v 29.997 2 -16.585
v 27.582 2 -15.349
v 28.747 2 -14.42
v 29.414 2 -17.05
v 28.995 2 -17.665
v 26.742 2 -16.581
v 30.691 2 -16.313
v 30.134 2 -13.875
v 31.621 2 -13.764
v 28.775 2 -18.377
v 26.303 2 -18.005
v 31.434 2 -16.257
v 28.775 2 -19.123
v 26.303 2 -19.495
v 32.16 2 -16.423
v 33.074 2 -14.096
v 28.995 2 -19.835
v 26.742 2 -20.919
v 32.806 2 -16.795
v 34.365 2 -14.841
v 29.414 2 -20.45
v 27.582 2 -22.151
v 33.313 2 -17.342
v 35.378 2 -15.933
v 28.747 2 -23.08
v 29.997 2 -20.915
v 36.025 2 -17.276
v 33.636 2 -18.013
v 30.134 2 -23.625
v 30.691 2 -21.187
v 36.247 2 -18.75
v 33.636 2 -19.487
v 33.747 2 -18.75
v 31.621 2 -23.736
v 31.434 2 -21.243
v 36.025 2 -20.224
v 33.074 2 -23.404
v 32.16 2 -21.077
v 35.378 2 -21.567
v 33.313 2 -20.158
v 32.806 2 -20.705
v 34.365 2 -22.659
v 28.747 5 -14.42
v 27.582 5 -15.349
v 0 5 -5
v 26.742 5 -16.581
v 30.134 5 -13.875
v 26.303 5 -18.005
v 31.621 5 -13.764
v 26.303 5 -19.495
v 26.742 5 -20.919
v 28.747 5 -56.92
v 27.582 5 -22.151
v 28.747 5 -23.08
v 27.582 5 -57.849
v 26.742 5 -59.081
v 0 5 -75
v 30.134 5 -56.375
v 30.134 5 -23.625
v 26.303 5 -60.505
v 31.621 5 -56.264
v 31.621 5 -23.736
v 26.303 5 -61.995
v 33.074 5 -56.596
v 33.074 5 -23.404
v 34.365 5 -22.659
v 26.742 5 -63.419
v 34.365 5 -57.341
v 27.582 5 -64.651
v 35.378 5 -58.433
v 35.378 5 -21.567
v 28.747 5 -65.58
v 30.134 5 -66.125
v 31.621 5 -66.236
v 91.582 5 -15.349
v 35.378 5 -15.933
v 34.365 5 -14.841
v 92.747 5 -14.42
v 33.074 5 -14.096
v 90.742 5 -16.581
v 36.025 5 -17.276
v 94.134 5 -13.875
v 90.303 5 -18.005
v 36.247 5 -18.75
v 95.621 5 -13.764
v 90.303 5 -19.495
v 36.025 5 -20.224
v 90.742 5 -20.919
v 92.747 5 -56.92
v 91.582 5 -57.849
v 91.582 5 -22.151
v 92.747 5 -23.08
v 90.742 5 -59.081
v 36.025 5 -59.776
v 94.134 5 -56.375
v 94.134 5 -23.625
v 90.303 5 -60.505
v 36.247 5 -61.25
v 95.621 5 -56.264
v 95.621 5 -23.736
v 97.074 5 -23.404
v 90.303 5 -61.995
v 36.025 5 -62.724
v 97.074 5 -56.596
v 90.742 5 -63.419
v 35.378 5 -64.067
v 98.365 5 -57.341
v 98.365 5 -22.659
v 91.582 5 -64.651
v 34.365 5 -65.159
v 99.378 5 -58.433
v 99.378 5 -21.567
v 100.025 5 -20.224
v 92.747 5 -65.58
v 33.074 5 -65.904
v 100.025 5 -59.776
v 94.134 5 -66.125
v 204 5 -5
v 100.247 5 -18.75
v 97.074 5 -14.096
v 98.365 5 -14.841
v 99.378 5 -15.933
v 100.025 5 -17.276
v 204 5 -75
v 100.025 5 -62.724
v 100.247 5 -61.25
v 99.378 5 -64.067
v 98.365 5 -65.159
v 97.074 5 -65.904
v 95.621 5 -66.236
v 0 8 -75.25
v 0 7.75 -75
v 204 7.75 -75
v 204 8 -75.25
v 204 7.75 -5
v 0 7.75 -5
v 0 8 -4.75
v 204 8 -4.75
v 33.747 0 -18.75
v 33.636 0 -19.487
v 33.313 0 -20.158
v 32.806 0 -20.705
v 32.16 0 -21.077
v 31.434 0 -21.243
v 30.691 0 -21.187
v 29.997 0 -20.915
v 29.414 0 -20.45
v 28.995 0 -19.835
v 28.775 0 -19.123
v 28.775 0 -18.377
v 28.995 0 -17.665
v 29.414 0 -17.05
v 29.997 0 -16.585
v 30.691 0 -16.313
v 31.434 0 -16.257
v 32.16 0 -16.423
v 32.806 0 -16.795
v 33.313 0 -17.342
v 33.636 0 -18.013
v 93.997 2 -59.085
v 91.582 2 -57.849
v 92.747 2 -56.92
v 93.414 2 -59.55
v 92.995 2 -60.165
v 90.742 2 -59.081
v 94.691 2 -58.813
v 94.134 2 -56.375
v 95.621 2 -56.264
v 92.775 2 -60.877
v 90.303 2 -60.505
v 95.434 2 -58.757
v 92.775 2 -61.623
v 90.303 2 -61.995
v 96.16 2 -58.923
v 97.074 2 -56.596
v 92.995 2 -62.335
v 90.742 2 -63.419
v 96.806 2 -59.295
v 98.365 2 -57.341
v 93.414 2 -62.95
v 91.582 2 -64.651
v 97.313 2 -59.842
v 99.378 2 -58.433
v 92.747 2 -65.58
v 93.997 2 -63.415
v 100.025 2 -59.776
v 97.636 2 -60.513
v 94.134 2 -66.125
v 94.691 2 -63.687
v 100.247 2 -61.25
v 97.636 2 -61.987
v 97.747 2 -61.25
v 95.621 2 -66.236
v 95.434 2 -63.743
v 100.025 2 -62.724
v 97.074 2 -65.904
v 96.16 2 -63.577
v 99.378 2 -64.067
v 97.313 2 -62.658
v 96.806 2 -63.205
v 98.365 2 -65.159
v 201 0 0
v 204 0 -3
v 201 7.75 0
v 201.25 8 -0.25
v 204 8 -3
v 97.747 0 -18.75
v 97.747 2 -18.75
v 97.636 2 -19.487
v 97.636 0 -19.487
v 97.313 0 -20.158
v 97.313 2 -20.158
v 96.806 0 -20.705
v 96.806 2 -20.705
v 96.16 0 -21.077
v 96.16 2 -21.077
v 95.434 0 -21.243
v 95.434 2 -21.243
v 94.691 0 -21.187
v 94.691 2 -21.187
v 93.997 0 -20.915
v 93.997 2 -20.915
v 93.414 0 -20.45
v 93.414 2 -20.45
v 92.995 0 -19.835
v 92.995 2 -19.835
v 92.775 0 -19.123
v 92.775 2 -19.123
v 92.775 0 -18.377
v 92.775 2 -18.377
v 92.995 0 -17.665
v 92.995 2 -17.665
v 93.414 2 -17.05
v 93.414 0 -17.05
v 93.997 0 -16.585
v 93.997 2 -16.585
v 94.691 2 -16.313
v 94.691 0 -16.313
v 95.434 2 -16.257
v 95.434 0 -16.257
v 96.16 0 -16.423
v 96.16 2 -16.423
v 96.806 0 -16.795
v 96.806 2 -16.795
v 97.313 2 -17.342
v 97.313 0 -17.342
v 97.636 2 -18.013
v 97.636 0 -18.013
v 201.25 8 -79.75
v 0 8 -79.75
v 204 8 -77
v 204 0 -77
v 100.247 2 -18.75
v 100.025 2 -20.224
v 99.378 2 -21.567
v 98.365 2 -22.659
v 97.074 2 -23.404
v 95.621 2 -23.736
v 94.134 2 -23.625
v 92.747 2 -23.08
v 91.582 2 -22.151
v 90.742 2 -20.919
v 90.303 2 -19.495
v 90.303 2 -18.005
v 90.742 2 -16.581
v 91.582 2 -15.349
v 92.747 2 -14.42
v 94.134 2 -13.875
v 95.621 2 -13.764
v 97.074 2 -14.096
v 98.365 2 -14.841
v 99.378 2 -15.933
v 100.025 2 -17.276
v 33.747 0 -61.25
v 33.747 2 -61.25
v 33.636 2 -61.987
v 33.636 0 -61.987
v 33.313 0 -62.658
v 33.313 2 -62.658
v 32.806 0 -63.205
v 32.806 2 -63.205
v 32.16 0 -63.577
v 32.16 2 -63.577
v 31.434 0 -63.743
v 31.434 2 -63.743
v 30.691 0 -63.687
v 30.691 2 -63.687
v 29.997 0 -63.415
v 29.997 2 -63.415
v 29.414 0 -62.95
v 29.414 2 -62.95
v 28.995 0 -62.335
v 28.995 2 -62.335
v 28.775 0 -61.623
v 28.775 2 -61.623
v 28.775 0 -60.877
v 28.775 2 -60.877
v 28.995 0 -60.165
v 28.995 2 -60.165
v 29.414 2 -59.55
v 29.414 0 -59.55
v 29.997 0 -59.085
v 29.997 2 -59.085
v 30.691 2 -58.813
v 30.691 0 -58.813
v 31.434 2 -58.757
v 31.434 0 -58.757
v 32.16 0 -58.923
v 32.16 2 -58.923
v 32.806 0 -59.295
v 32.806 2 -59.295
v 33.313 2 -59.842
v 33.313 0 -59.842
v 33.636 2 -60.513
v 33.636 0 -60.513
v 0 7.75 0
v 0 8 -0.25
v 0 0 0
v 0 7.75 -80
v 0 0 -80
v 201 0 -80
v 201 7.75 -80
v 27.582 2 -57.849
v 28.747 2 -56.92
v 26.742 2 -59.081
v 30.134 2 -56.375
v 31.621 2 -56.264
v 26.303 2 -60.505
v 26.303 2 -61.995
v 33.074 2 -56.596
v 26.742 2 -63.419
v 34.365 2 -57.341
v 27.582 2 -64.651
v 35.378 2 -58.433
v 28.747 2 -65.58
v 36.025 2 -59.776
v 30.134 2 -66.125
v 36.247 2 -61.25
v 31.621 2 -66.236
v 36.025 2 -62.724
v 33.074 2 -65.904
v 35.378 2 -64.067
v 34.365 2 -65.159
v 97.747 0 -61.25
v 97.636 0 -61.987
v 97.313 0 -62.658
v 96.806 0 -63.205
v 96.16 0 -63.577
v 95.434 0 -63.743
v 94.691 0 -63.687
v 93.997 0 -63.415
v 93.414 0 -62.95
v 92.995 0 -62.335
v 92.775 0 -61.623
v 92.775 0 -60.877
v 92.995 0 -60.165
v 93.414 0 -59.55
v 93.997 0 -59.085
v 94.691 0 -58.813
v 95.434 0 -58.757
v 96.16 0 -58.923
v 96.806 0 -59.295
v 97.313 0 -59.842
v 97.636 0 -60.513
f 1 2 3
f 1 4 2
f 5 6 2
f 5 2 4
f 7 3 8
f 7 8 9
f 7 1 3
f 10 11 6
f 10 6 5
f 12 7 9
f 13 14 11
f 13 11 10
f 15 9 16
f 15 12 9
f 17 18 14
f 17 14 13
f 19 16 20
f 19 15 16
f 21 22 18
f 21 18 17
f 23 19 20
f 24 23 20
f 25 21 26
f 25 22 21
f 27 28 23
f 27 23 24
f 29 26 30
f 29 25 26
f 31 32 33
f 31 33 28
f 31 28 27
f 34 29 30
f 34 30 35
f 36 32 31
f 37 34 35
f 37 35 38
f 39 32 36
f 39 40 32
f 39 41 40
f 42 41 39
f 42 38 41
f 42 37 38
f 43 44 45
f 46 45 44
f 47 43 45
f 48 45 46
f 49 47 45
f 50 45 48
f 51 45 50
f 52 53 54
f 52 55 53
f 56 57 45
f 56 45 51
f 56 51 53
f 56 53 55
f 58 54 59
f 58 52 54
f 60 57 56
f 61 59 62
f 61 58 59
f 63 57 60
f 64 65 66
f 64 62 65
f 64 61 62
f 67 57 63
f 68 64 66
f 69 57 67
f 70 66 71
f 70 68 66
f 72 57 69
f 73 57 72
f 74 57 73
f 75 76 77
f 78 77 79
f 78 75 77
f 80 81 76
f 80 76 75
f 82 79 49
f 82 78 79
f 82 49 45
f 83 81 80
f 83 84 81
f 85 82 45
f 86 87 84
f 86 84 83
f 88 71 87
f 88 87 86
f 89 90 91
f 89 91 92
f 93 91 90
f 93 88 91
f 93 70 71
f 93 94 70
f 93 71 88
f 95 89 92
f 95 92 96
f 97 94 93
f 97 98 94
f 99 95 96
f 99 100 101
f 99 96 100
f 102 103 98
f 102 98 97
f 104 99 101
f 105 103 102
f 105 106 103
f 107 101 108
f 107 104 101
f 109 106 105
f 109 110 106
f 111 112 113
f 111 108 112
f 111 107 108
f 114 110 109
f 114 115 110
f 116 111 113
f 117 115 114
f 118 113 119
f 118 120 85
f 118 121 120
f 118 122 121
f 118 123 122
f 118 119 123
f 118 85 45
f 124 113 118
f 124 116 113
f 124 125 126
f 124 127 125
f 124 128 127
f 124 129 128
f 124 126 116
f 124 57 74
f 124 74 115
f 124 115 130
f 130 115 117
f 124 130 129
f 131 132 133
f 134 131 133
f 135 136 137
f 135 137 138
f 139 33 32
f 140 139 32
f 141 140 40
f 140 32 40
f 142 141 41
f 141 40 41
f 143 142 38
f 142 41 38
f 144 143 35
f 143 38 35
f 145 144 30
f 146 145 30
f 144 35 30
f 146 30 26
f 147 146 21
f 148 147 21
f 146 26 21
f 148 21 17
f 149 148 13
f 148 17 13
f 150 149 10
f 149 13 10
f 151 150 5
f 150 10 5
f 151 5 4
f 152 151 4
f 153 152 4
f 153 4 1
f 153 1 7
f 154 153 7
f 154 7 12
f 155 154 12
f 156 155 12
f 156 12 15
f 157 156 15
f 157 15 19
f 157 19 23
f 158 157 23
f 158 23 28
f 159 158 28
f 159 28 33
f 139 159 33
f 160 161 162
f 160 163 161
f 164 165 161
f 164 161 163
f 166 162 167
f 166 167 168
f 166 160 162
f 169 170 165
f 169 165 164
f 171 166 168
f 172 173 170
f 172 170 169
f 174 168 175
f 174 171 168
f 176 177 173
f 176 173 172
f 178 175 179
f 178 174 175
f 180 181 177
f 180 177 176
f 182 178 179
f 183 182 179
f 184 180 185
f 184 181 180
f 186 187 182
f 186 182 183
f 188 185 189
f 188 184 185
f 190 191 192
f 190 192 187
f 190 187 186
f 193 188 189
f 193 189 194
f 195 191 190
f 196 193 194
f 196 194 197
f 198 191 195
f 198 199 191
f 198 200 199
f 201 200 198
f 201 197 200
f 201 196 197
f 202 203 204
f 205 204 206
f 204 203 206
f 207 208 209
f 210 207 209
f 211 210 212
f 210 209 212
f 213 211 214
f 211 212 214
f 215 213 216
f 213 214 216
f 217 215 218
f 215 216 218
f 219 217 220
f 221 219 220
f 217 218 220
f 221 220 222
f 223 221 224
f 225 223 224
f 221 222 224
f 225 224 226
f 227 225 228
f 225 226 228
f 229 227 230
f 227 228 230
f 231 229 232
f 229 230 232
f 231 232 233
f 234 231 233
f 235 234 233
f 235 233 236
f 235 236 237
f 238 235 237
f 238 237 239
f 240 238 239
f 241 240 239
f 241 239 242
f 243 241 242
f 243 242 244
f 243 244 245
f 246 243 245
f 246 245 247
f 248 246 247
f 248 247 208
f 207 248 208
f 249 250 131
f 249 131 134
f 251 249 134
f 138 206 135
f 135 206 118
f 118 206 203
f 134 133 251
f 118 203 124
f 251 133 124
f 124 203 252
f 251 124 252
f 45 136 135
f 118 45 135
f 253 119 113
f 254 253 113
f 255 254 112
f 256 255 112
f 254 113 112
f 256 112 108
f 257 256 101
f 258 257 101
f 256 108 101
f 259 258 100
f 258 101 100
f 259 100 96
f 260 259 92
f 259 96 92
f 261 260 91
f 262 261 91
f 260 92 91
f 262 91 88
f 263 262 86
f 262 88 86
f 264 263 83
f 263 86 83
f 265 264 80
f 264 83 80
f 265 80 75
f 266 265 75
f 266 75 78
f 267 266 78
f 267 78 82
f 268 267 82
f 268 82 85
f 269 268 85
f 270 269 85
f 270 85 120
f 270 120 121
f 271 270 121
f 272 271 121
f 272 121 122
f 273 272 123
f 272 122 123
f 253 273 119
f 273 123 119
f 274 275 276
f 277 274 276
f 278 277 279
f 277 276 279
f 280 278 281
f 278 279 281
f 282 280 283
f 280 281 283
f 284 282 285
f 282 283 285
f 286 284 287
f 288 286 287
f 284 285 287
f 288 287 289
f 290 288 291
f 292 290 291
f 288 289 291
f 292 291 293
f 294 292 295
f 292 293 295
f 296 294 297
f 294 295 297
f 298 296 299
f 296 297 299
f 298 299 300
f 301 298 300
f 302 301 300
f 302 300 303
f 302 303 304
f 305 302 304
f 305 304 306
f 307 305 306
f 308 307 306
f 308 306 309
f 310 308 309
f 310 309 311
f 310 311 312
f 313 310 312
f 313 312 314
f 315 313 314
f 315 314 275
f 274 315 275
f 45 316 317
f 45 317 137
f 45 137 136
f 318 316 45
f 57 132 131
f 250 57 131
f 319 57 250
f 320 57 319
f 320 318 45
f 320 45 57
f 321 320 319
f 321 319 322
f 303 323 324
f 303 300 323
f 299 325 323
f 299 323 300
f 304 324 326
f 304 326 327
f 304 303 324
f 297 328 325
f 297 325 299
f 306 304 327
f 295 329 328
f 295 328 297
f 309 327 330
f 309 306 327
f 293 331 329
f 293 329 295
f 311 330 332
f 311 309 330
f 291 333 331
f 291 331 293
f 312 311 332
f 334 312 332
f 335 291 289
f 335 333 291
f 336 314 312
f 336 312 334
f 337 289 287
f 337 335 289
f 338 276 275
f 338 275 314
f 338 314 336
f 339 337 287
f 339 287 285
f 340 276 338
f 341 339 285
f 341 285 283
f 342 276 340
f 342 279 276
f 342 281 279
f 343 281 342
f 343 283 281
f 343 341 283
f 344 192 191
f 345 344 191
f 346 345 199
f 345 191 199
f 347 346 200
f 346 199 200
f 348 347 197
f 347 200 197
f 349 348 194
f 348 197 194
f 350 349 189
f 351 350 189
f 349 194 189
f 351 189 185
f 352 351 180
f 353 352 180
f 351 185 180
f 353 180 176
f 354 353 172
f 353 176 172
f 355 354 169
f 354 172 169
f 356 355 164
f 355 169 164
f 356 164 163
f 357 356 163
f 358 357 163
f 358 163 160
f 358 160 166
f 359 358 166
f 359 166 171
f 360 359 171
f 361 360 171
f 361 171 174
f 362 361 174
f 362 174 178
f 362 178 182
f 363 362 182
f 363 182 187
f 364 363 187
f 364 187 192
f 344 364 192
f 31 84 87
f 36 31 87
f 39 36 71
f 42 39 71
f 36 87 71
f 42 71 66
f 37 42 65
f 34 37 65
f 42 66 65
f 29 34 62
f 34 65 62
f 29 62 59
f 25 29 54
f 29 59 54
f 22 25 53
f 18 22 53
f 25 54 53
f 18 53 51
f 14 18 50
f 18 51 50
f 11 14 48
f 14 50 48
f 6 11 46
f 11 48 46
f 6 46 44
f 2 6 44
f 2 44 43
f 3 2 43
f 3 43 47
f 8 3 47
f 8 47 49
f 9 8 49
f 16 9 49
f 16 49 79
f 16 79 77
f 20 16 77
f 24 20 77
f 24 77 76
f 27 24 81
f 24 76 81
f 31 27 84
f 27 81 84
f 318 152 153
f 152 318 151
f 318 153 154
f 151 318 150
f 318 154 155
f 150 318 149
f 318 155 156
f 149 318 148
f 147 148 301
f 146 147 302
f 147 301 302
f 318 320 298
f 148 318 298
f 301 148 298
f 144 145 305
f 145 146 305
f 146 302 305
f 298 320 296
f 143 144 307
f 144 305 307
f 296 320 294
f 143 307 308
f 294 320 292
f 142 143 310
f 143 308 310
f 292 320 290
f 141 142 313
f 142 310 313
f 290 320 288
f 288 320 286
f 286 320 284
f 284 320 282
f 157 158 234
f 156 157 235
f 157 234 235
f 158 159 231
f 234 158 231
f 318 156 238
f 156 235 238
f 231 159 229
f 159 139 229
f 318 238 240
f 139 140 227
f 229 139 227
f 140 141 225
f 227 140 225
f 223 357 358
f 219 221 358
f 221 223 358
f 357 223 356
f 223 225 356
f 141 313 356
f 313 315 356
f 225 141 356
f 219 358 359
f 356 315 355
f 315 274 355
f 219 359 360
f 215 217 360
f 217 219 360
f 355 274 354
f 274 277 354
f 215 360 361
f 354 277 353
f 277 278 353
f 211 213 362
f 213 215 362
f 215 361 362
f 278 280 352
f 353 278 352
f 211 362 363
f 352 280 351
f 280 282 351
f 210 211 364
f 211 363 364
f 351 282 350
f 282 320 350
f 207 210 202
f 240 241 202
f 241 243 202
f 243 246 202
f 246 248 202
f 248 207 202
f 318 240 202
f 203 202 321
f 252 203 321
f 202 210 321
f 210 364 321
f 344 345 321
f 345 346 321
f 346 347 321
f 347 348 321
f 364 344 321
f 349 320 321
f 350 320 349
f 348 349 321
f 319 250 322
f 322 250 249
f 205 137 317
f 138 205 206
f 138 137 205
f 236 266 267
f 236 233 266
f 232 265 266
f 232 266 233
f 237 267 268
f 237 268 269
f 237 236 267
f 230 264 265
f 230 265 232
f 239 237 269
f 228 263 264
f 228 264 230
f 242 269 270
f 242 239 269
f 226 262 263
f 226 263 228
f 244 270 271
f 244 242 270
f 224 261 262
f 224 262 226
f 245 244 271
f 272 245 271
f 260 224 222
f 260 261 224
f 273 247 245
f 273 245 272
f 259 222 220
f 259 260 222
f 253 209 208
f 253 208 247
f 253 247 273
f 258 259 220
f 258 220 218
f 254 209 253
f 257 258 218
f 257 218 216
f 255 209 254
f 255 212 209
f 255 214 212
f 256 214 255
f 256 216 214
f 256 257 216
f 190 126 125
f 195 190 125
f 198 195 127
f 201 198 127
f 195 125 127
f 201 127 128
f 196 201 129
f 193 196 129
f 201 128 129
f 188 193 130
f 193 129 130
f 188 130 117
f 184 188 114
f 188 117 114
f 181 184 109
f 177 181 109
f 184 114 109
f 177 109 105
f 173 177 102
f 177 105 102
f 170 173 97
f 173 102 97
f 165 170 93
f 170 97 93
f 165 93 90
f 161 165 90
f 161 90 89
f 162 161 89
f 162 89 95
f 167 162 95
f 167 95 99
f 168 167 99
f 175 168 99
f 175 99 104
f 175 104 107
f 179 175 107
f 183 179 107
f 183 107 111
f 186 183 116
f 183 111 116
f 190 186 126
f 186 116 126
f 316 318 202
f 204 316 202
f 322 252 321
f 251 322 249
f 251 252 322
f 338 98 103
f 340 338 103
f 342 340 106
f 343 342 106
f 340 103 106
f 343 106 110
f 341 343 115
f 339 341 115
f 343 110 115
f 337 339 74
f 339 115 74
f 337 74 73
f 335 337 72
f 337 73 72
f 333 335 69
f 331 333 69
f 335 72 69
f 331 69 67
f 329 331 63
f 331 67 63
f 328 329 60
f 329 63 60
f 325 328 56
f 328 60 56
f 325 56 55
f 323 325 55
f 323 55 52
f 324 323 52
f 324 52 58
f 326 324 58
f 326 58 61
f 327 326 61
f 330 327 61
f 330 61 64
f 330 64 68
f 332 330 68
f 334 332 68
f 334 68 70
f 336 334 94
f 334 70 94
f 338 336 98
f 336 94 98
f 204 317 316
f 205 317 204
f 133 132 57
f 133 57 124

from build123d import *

# Parameters (mm, degrees)
SKETCH1_W           = 204
SKETCH1_H           = 80
BOSS_EXTRUDE1_DEPTH = 8
SKETCH2_W           = 204
SKETCH2_H           = 70
CUT_EXTRUDE1_DEPTH  = 3
SKETCH3_R           = 5
CUT_EXTRUDE2_DEPTH  = 3
SKETCH4_R           = 2.5
CUT_EXTRUDE3_DEPTH  = 3
CHAMFER1_SIZE       = 3
CHAMFER2_SIZE       = 0.25


with BuildPart() as part:
    # Sketch1 → Boss-Extrude1 (new body)
    with BuildSketch(Plane(origin=(0, 0, 0), x_dir=(1, 0, 0), z_dir=(0, 1, 0))):
        with Locations((102, 40)):
            Rectangle(SKETCH1_W, SKETCH1_H)
    extrude(amount=BOSS_EXTRUDE1_DEPTH)

    # Sketch2 → Cut-Extrude1 (cut)
    with BuildSketch(Plane(origin=(0, 8, 0), x_dir=(1, 0, 0), z_dir=(0, 1, 0))):
        with Locations((102, 40)):
            Rectangle(SKETCH2_W, SKETCH2_H)
    extrude(amount=-CUT_EXTRUDE1_DEPTH, mode=Mode.SUBTRACT)

    # Sketch3 → Cut-Extrude2 (cut)
    with BuildSketch(Plane(origin=(0, 5, 0), x_dir=(1, 0, 0), z_dir=(0, 1, 0))):
        with Locations((31.247103349, 61.25)):
            Circle(SKETCH3_R)
        with Locations((95.247103349, 61.25)):
            Circle(SKETCH3_R)
        with Locations((31.247103349, 18.75)):
            Circle(SKETCH3_R)
        with Locations((95.247103349, 18.75)):
            Circle(SKETCH3_R)
    extrude(amount=-CUT_EXTRUDE2_DEPTH, mode=Mode.SUBTRACT)

    # Sketch4 → Cut-Extrude3 (cut, through all)
    with BuildSketch(Plane(origin=(0, 2, 0), x_dir=(1, 0, 0), z_dir=(0, 1, 0))):
        with Locations((31.247103349, 61.25)):
            Circle(SKETCH4_R)
        with Locations((95.247103349, 61.25)):
            Circle(SKETCH4_R)
        with Locations((95.247103349, 18.75)):
            Circle(SKETCH4_R)
        with Locations((31.247103349, 18.75)):
            Circle(SKETCH4_R)
    extrude(amount=-CUT_EXTRUDE3_DEPTH, mode=Mode.SUBTRACT)

    # Chamfer1
    chamfer1_edges = [part.edges().sort_by_distance(p)[0] for p in [
        (204, 4, -80),
        (204, 4, 0),
    ]]
    chamfer(chamfer1_edges, length=CHAMFER1_SIZE)

    # Chamfer2
    chamfer2_edges = [part.edges().sort_by_distance(p)[0] for p in [
        (102, 8, -5),
        (102, 8, -75),
        (100.5, 8, -80),
        (100.5, 8, 0),
    ]]
    chamfer(chamfer2_edges, length=CHAMFER2_SIZE)


solid = part.part
